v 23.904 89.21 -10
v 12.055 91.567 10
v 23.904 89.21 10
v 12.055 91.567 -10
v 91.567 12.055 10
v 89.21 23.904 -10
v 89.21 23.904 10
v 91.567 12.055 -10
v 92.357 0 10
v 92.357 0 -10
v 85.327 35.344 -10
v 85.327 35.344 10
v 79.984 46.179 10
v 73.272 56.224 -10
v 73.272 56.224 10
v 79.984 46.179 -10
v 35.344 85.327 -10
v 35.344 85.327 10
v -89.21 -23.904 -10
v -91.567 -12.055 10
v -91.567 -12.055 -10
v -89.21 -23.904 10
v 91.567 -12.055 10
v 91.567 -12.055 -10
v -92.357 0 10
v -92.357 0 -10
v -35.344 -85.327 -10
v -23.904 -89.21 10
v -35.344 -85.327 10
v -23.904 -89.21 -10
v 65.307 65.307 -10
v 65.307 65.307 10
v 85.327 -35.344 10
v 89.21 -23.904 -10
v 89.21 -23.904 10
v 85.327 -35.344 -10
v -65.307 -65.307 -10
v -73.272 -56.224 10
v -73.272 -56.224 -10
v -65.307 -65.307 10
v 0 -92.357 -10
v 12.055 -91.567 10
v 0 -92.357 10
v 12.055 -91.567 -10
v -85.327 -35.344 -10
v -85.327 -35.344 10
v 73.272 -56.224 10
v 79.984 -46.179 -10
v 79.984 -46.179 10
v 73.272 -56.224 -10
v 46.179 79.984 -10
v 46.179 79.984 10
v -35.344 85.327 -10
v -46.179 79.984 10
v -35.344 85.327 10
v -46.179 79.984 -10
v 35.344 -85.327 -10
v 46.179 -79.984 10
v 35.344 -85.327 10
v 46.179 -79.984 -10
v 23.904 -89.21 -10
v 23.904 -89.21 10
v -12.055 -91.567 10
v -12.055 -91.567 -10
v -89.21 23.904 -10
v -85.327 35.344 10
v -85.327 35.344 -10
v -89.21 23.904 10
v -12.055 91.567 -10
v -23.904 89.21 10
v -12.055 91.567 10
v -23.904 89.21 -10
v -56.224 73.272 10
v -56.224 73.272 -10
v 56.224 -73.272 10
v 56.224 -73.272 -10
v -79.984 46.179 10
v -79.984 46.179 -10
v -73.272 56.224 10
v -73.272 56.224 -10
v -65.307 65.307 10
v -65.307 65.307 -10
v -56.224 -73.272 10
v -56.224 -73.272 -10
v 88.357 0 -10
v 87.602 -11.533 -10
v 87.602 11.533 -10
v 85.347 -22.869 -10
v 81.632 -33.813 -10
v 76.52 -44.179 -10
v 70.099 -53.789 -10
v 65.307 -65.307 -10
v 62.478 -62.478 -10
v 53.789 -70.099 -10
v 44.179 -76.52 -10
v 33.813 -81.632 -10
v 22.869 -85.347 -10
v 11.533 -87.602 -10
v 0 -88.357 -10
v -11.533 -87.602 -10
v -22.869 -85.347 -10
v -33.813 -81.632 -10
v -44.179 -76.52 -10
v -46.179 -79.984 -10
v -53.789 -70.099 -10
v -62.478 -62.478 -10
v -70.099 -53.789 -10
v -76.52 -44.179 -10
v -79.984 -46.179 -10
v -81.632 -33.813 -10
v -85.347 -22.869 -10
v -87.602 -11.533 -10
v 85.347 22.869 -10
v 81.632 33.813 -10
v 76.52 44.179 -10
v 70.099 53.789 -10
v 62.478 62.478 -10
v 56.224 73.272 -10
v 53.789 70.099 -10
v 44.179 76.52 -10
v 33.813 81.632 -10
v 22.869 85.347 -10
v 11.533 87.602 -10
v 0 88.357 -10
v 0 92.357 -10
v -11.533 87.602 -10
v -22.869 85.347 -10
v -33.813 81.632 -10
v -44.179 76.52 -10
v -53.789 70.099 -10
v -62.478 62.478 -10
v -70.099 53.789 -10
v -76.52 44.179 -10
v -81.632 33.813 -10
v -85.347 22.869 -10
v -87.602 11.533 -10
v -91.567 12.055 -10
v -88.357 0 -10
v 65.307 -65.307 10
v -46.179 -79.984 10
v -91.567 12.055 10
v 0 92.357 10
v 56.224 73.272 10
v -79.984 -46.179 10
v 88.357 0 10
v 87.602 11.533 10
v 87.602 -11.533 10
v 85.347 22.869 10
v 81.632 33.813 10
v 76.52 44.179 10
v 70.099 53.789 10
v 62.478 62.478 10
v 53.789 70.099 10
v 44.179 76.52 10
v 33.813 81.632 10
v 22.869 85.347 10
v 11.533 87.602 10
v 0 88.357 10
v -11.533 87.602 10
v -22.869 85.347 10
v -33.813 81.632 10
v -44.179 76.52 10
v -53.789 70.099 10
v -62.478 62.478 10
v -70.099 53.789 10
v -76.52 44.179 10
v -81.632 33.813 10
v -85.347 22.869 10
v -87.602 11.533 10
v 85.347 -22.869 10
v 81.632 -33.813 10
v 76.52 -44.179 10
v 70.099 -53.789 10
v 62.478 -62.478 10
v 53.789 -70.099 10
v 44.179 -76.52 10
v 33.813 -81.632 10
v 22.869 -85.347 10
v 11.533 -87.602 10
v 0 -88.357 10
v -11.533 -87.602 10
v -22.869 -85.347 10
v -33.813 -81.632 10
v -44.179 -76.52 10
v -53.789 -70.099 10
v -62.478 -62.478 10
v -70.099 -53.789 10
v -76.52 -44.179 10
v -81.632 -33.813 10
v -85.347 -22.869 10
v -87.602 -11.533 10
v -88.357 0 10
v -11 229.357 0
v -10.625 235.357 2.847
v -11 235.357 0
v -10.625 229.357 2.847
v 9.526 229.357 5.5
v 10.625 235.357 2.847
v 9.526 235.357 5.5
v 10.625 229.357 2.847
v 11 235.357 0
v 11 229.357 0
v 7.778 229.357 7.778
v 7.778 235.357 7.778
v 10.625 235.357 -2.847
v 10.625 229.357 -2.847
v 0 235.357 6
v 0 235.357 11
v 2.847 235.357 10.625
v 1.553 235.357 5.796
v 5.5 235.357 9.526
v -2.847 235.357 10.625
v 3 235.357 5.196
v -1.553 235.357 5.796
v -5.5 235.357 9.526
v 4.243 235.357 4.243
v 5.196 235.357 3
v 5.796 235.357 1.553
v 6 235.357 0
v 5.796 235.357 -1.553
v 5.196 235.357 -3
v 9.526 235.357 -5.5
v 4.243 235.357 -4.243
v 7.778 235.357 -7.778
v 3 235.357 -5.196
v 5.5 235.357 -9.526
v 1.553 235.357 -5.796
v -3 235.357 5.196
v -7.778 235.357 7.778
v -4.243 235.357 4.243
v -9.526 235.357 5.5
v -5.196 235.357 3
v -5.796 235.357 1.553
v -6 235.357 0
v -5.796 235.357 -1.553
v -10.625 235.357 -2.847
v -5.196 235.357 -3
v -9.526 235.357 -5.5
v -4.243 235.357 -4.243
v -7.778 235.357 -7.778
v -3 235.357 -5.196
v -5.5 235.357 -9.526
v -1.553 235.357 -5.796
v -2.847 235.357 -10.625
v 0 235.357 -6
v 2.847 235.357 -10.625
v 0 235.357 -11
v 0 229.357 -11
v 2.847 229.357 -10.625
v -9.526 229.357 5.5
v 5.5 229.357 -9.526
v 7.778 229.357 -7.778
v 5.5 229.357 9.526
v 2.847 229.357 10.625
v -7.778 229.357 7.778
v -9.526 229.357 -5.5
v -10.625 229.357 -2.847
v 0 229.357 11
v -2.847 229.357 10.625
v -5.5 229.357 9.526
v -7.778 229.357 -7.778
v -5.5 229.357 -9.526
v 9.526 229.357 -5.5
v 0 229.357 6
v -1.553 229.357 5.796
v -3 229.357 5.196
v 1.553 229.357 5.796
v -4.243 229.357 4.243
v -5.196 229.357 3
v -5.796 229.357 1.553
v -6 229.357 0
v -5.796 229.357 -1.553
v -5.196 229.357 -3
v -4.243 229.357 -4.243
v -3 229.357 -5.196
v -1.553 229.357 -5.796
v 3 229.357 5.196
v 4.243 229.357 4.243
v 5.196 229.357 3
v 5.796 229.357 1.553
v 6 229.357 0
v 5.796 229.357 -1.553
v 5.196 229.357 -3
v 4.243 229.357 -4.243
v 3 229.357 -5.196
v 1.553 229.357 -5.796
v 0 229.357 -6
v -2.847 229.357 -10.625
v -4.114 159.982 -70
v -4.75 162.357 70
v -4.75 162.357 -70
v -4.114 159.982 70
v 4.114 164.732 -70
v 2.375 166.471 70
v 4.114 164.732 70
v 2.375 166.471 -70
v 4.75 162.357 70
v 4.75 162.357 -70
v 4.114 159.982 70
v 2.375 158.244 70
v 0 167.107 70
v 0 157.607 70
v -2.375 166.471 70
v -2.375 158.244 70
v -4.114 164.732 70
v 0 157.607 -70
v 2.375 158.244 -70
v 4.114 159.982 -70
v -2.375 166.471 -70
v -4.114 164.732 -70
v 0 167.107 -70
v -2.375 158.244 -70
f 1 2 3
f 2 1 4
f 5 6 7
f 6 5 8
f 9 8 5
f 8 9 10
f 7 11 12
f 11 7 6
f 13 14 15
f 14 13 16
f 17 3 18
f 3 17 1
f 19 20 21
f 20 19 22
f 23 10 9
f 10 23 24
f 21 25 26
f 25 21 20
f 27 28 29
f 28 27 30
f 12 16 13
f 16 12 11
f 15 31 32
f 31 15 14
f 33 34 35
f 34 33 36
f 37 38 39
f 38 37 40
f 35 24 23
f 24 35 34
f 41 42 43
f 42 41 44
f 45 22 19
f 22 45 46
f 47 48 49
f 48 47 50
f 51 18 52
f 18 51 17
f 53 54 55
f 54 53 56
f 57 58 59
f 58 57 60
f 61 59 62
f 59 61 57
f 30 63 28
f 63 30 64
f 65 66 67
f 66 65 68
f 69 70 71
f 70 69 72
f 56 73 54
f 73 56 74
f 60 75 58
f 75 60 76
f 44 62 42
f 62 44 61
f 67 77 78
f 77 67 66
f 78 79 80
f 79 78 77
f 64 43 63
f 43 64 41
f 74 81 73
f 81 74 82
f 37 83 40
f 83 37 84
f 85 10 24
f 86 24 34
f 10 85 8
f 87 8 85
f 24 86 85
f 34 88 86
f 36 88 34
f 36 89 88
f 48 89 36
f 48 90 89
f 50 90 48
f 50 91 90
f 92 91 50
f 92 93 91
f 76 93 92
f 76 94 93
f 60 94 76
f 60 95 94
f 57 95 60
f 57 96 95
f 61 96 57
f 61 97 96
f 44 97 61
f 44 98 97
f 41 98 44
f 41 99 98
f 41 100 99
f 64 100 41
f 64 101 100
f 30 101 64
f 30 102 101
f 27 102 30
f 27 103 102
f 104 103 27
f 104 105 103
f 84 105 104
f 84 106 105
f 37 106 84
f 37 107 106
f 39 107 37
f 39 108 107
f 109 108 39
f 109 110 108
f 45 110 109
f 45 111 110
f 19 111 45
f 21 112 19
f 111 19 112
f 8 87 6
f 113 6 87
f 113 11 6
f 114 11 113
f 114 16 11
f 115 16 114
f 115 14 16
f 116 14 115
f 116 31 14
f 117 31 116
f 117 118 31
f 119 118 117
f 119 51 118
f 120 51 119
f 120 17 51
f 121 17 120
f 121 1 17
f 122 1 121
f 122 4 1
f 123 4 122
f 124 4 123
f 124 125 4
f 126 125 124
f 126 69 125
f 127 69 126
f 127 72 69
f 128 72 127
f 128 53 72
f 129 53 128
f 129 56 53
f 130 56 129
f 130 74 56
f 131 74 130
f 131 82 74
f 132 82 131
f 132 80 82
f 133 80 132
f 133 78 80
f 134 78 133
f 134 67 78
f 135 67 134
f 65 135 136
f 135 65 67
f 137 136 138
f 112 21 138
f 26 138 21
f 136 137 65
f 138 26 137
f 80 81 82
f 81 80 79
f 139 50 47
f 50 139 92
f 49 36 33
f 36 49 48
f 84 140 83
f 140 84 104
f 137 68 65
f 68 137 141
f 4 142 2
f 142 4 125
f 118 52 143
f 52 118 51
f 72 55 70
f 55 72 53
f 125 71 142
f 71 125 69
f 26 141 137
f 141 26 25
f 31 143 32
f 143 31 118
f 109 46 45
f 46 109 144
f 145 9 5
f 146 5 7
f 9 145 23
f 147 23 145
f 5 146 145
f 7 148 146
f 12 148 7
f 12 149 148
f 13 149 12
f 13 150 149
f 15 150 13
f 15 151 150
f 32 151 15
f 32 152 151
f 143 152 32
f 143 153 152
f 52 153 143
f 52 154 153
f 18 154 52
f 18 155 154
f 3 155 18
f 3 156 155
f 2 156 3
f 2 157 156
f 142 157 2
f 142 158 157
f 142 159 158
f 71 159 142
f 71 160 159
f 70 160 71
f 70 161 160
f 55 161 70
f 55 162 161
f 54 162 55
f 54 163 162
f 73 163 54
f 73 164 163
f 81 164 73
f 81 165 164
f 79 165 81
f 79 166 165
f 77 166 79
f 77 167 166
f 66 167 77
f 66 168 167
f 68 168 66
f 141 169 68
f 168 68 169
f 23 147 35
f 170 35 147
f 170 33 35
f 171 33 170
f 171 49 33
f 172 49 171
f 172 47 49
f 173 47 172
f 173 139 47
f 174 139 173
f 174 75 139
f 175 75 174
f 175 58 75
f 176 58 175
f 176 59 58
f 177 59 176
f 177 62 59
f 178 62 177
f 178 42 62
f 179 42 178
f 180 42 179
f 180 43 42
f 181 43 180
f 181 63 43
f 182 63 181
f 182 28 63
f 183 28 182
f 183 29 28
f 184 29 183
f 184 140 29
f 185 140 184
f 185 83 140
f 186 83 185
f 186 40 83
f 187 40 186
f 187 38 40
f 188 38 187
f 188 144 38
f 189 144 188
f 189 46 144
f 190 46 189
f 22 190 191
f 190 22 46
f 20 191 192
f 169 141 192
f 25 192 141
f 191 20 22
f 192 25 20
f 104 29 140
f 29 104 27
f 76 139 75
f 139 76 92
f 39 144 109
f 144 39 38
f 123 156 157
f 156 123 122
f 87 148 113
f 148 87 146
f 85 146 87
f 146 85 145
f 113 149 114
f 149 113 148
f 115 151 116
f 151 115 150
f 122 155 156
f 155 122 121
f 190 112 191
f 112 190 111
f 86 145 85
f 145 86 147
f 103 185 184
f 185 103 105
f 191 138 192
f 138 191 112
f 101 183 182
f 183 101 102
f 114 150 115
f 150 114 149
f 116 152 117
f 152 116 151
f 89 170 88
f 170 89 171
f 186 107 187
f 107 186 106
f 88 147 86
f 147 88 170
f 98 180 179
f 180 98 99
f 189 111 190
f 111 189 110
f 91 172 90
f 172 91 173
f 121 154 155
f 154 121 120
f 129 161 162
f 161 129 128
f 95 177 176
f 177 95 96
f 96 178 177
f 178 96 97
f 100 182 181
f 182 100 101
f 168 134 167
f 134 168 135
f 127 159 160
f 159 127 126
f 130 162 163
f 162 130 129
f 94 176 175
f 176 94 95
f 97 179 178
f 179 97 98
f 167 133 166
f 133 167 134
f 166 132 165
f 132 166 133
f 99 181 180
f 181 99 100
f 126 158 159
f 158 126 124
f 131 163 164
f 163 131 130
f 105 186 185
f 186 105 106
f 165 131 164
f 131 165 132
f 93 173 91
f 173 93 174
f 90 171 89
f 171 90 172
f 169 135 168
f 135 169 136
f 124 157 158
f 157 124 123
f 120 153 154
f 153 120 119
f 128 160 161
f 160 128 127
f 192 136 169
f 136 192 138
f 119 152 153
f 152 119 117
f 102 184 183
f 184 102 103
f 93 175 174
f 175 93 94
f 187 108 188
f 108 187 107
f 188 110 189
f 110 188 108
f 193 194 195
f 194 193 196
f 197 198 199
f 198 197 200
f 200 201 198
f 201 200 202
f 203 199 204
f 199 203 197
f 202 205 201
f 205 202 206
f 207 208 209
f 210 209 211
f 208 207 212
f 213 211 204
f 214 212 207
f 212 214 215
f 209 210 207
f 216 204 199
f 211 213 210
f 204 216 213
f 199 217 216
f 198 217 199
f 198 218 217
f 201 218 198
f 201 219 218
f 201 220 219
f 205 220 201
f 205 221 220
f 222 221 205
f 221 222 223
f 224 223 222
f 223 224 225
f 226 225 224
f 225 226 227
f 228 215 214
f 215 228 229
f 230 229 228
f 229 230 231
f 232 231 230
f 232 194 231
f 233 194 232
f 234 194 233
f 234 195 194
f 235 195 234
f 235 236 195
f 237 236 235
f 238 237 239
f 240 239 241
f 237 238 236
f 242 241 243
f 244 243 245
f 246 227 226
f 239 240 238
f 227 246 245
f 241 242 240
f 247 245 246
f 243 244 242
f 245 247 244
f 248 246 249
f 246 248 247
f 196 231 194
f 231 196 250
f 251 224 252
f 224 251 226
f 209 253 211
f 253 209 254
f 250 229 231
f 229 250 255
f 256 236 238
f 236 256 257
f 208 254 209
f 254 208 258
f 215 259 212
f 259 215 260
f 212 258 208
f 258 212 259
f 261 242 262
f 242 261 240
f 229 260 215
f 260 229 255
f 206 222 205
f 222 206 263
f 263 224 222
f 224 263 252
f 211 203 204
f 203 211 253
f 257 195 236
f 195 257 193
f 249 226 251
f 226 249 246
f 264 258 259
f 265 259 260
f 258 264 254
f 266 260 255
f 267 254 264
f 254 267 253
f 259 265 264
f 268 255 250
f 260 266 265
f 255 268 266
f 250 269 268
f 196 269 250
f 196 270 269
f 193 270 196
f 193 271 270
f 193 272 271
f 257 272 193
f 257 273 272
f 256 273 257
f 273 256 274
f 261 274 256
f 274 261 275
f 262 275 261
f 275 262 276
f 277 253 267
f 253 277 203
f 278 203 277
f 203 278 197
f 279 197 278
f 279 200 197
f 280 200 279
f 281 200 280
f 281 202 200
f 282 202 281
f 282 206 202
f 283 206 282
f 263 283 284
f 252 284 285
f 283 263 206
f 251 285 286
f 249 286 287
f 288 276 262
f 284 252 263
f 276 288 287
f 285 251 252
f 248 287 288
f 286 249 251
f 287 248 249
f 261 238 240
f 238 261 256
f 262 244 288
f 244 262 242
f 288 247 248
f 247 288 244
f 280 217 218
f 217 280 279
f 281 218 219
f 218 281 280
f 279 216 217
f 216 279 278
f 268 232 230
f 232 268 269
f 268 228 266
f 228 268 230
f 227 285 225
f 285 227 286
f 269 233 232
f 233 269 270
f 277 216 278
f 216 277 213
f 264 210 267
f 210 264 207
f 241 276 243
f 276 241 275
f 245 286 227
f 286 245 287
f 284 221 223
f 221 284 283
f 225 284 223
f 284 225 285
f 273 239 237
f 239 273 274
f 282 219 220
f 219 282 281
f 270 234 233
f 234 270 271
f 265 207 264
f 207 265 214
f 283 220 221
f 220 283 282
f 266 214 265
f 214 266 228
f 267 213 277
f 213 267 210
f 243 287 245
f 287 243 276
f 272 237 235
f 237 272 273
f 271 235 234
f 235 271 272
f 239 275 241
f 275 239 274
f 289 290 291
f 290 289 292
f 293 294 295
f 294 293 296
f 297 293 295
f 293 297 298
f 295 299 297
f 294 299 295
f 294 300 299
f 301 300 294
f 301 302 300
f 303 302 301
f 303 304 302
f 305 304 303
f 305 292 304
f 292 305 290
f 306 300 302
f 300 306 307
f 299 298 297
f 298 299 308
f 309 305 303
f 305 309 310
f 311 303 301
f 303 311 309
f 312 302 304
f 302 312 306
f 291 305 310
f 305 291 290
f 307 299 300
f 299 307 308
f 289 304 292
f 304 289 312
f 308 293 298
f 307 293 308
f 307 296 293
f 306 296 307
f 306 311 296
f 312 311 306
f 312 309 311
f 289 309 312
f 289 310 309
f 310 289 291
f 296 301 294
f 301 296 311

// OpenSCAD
// Auto-generated by scripts/author_from_manifest.py (Phase D.3).
// Source: data/phase_d_manifest.json (sku_intent='tolco-fig4-swivel-ring-6in').
// Do not hand-edit — regenerate from the manifest.
//
// @part tolco_fig4_swivel_ring_6in
// @kind hanger
// @category hanger.swivel.ring
// @display-name "Tolco FIG 4 Adjustable Swivel Ring Hanger 6\""
// @mfg nvent_tolco
// @mfg-pn FIG_4_6in
// @listing UL
// @price-usd 8.30
// @install-minutes 4
// @crew journeyman
// @param size_in number default=6 label="Size" unit="in"
// @port pipe position=[0,0,0] direction=[0,1,0] style=grooved size_in=6 role=run_a

size_in = 6.0;

function od_mm(nps) =
    nps ==   1  ? 33.4 :
    nps == 1.25 ? 42.2 :
    nps == 1.5  ? 48.3 :
    nps ==   2  ? 60.3 :
    nps == 2.5  ? 73.0 :
    nps ==   3  ? 88.9 :
    nps ==   4  ? 114.3 :
    nps ==   6  ? 168.3 :
    nps ==   8  ? 219.1 : 60.3;

od = od_mm(size_in);
ring_id = od * 1.05;
ring_od = ring_id + 8;
strap_w = 20;
rod_len = 140;

union() {
    // Ring
    difference() {
        cylinder(h = strap_w, d = ring_od, center = true, $fn = 48);
        cylinder(h = strap_w + 1, d = ring_id, center = true, $fn = 48);
    }
    // Rod up +Y
    translate([0, rod_len/2 + ring_od/2, 0])
        cylinder(h = rod_len, d = 9.5, center = true, $fn = 12);
    // Top swivel eye
    translate([0, rod_len + ring_od/2, 0])
        rotate([90, 0, 0])
        difference() {
            cylinder(h = 6, d = 22, center = true, $fn = 24);
            cylinder(h = 8, d = 12, center = true, $fn = 24);
        }
}
